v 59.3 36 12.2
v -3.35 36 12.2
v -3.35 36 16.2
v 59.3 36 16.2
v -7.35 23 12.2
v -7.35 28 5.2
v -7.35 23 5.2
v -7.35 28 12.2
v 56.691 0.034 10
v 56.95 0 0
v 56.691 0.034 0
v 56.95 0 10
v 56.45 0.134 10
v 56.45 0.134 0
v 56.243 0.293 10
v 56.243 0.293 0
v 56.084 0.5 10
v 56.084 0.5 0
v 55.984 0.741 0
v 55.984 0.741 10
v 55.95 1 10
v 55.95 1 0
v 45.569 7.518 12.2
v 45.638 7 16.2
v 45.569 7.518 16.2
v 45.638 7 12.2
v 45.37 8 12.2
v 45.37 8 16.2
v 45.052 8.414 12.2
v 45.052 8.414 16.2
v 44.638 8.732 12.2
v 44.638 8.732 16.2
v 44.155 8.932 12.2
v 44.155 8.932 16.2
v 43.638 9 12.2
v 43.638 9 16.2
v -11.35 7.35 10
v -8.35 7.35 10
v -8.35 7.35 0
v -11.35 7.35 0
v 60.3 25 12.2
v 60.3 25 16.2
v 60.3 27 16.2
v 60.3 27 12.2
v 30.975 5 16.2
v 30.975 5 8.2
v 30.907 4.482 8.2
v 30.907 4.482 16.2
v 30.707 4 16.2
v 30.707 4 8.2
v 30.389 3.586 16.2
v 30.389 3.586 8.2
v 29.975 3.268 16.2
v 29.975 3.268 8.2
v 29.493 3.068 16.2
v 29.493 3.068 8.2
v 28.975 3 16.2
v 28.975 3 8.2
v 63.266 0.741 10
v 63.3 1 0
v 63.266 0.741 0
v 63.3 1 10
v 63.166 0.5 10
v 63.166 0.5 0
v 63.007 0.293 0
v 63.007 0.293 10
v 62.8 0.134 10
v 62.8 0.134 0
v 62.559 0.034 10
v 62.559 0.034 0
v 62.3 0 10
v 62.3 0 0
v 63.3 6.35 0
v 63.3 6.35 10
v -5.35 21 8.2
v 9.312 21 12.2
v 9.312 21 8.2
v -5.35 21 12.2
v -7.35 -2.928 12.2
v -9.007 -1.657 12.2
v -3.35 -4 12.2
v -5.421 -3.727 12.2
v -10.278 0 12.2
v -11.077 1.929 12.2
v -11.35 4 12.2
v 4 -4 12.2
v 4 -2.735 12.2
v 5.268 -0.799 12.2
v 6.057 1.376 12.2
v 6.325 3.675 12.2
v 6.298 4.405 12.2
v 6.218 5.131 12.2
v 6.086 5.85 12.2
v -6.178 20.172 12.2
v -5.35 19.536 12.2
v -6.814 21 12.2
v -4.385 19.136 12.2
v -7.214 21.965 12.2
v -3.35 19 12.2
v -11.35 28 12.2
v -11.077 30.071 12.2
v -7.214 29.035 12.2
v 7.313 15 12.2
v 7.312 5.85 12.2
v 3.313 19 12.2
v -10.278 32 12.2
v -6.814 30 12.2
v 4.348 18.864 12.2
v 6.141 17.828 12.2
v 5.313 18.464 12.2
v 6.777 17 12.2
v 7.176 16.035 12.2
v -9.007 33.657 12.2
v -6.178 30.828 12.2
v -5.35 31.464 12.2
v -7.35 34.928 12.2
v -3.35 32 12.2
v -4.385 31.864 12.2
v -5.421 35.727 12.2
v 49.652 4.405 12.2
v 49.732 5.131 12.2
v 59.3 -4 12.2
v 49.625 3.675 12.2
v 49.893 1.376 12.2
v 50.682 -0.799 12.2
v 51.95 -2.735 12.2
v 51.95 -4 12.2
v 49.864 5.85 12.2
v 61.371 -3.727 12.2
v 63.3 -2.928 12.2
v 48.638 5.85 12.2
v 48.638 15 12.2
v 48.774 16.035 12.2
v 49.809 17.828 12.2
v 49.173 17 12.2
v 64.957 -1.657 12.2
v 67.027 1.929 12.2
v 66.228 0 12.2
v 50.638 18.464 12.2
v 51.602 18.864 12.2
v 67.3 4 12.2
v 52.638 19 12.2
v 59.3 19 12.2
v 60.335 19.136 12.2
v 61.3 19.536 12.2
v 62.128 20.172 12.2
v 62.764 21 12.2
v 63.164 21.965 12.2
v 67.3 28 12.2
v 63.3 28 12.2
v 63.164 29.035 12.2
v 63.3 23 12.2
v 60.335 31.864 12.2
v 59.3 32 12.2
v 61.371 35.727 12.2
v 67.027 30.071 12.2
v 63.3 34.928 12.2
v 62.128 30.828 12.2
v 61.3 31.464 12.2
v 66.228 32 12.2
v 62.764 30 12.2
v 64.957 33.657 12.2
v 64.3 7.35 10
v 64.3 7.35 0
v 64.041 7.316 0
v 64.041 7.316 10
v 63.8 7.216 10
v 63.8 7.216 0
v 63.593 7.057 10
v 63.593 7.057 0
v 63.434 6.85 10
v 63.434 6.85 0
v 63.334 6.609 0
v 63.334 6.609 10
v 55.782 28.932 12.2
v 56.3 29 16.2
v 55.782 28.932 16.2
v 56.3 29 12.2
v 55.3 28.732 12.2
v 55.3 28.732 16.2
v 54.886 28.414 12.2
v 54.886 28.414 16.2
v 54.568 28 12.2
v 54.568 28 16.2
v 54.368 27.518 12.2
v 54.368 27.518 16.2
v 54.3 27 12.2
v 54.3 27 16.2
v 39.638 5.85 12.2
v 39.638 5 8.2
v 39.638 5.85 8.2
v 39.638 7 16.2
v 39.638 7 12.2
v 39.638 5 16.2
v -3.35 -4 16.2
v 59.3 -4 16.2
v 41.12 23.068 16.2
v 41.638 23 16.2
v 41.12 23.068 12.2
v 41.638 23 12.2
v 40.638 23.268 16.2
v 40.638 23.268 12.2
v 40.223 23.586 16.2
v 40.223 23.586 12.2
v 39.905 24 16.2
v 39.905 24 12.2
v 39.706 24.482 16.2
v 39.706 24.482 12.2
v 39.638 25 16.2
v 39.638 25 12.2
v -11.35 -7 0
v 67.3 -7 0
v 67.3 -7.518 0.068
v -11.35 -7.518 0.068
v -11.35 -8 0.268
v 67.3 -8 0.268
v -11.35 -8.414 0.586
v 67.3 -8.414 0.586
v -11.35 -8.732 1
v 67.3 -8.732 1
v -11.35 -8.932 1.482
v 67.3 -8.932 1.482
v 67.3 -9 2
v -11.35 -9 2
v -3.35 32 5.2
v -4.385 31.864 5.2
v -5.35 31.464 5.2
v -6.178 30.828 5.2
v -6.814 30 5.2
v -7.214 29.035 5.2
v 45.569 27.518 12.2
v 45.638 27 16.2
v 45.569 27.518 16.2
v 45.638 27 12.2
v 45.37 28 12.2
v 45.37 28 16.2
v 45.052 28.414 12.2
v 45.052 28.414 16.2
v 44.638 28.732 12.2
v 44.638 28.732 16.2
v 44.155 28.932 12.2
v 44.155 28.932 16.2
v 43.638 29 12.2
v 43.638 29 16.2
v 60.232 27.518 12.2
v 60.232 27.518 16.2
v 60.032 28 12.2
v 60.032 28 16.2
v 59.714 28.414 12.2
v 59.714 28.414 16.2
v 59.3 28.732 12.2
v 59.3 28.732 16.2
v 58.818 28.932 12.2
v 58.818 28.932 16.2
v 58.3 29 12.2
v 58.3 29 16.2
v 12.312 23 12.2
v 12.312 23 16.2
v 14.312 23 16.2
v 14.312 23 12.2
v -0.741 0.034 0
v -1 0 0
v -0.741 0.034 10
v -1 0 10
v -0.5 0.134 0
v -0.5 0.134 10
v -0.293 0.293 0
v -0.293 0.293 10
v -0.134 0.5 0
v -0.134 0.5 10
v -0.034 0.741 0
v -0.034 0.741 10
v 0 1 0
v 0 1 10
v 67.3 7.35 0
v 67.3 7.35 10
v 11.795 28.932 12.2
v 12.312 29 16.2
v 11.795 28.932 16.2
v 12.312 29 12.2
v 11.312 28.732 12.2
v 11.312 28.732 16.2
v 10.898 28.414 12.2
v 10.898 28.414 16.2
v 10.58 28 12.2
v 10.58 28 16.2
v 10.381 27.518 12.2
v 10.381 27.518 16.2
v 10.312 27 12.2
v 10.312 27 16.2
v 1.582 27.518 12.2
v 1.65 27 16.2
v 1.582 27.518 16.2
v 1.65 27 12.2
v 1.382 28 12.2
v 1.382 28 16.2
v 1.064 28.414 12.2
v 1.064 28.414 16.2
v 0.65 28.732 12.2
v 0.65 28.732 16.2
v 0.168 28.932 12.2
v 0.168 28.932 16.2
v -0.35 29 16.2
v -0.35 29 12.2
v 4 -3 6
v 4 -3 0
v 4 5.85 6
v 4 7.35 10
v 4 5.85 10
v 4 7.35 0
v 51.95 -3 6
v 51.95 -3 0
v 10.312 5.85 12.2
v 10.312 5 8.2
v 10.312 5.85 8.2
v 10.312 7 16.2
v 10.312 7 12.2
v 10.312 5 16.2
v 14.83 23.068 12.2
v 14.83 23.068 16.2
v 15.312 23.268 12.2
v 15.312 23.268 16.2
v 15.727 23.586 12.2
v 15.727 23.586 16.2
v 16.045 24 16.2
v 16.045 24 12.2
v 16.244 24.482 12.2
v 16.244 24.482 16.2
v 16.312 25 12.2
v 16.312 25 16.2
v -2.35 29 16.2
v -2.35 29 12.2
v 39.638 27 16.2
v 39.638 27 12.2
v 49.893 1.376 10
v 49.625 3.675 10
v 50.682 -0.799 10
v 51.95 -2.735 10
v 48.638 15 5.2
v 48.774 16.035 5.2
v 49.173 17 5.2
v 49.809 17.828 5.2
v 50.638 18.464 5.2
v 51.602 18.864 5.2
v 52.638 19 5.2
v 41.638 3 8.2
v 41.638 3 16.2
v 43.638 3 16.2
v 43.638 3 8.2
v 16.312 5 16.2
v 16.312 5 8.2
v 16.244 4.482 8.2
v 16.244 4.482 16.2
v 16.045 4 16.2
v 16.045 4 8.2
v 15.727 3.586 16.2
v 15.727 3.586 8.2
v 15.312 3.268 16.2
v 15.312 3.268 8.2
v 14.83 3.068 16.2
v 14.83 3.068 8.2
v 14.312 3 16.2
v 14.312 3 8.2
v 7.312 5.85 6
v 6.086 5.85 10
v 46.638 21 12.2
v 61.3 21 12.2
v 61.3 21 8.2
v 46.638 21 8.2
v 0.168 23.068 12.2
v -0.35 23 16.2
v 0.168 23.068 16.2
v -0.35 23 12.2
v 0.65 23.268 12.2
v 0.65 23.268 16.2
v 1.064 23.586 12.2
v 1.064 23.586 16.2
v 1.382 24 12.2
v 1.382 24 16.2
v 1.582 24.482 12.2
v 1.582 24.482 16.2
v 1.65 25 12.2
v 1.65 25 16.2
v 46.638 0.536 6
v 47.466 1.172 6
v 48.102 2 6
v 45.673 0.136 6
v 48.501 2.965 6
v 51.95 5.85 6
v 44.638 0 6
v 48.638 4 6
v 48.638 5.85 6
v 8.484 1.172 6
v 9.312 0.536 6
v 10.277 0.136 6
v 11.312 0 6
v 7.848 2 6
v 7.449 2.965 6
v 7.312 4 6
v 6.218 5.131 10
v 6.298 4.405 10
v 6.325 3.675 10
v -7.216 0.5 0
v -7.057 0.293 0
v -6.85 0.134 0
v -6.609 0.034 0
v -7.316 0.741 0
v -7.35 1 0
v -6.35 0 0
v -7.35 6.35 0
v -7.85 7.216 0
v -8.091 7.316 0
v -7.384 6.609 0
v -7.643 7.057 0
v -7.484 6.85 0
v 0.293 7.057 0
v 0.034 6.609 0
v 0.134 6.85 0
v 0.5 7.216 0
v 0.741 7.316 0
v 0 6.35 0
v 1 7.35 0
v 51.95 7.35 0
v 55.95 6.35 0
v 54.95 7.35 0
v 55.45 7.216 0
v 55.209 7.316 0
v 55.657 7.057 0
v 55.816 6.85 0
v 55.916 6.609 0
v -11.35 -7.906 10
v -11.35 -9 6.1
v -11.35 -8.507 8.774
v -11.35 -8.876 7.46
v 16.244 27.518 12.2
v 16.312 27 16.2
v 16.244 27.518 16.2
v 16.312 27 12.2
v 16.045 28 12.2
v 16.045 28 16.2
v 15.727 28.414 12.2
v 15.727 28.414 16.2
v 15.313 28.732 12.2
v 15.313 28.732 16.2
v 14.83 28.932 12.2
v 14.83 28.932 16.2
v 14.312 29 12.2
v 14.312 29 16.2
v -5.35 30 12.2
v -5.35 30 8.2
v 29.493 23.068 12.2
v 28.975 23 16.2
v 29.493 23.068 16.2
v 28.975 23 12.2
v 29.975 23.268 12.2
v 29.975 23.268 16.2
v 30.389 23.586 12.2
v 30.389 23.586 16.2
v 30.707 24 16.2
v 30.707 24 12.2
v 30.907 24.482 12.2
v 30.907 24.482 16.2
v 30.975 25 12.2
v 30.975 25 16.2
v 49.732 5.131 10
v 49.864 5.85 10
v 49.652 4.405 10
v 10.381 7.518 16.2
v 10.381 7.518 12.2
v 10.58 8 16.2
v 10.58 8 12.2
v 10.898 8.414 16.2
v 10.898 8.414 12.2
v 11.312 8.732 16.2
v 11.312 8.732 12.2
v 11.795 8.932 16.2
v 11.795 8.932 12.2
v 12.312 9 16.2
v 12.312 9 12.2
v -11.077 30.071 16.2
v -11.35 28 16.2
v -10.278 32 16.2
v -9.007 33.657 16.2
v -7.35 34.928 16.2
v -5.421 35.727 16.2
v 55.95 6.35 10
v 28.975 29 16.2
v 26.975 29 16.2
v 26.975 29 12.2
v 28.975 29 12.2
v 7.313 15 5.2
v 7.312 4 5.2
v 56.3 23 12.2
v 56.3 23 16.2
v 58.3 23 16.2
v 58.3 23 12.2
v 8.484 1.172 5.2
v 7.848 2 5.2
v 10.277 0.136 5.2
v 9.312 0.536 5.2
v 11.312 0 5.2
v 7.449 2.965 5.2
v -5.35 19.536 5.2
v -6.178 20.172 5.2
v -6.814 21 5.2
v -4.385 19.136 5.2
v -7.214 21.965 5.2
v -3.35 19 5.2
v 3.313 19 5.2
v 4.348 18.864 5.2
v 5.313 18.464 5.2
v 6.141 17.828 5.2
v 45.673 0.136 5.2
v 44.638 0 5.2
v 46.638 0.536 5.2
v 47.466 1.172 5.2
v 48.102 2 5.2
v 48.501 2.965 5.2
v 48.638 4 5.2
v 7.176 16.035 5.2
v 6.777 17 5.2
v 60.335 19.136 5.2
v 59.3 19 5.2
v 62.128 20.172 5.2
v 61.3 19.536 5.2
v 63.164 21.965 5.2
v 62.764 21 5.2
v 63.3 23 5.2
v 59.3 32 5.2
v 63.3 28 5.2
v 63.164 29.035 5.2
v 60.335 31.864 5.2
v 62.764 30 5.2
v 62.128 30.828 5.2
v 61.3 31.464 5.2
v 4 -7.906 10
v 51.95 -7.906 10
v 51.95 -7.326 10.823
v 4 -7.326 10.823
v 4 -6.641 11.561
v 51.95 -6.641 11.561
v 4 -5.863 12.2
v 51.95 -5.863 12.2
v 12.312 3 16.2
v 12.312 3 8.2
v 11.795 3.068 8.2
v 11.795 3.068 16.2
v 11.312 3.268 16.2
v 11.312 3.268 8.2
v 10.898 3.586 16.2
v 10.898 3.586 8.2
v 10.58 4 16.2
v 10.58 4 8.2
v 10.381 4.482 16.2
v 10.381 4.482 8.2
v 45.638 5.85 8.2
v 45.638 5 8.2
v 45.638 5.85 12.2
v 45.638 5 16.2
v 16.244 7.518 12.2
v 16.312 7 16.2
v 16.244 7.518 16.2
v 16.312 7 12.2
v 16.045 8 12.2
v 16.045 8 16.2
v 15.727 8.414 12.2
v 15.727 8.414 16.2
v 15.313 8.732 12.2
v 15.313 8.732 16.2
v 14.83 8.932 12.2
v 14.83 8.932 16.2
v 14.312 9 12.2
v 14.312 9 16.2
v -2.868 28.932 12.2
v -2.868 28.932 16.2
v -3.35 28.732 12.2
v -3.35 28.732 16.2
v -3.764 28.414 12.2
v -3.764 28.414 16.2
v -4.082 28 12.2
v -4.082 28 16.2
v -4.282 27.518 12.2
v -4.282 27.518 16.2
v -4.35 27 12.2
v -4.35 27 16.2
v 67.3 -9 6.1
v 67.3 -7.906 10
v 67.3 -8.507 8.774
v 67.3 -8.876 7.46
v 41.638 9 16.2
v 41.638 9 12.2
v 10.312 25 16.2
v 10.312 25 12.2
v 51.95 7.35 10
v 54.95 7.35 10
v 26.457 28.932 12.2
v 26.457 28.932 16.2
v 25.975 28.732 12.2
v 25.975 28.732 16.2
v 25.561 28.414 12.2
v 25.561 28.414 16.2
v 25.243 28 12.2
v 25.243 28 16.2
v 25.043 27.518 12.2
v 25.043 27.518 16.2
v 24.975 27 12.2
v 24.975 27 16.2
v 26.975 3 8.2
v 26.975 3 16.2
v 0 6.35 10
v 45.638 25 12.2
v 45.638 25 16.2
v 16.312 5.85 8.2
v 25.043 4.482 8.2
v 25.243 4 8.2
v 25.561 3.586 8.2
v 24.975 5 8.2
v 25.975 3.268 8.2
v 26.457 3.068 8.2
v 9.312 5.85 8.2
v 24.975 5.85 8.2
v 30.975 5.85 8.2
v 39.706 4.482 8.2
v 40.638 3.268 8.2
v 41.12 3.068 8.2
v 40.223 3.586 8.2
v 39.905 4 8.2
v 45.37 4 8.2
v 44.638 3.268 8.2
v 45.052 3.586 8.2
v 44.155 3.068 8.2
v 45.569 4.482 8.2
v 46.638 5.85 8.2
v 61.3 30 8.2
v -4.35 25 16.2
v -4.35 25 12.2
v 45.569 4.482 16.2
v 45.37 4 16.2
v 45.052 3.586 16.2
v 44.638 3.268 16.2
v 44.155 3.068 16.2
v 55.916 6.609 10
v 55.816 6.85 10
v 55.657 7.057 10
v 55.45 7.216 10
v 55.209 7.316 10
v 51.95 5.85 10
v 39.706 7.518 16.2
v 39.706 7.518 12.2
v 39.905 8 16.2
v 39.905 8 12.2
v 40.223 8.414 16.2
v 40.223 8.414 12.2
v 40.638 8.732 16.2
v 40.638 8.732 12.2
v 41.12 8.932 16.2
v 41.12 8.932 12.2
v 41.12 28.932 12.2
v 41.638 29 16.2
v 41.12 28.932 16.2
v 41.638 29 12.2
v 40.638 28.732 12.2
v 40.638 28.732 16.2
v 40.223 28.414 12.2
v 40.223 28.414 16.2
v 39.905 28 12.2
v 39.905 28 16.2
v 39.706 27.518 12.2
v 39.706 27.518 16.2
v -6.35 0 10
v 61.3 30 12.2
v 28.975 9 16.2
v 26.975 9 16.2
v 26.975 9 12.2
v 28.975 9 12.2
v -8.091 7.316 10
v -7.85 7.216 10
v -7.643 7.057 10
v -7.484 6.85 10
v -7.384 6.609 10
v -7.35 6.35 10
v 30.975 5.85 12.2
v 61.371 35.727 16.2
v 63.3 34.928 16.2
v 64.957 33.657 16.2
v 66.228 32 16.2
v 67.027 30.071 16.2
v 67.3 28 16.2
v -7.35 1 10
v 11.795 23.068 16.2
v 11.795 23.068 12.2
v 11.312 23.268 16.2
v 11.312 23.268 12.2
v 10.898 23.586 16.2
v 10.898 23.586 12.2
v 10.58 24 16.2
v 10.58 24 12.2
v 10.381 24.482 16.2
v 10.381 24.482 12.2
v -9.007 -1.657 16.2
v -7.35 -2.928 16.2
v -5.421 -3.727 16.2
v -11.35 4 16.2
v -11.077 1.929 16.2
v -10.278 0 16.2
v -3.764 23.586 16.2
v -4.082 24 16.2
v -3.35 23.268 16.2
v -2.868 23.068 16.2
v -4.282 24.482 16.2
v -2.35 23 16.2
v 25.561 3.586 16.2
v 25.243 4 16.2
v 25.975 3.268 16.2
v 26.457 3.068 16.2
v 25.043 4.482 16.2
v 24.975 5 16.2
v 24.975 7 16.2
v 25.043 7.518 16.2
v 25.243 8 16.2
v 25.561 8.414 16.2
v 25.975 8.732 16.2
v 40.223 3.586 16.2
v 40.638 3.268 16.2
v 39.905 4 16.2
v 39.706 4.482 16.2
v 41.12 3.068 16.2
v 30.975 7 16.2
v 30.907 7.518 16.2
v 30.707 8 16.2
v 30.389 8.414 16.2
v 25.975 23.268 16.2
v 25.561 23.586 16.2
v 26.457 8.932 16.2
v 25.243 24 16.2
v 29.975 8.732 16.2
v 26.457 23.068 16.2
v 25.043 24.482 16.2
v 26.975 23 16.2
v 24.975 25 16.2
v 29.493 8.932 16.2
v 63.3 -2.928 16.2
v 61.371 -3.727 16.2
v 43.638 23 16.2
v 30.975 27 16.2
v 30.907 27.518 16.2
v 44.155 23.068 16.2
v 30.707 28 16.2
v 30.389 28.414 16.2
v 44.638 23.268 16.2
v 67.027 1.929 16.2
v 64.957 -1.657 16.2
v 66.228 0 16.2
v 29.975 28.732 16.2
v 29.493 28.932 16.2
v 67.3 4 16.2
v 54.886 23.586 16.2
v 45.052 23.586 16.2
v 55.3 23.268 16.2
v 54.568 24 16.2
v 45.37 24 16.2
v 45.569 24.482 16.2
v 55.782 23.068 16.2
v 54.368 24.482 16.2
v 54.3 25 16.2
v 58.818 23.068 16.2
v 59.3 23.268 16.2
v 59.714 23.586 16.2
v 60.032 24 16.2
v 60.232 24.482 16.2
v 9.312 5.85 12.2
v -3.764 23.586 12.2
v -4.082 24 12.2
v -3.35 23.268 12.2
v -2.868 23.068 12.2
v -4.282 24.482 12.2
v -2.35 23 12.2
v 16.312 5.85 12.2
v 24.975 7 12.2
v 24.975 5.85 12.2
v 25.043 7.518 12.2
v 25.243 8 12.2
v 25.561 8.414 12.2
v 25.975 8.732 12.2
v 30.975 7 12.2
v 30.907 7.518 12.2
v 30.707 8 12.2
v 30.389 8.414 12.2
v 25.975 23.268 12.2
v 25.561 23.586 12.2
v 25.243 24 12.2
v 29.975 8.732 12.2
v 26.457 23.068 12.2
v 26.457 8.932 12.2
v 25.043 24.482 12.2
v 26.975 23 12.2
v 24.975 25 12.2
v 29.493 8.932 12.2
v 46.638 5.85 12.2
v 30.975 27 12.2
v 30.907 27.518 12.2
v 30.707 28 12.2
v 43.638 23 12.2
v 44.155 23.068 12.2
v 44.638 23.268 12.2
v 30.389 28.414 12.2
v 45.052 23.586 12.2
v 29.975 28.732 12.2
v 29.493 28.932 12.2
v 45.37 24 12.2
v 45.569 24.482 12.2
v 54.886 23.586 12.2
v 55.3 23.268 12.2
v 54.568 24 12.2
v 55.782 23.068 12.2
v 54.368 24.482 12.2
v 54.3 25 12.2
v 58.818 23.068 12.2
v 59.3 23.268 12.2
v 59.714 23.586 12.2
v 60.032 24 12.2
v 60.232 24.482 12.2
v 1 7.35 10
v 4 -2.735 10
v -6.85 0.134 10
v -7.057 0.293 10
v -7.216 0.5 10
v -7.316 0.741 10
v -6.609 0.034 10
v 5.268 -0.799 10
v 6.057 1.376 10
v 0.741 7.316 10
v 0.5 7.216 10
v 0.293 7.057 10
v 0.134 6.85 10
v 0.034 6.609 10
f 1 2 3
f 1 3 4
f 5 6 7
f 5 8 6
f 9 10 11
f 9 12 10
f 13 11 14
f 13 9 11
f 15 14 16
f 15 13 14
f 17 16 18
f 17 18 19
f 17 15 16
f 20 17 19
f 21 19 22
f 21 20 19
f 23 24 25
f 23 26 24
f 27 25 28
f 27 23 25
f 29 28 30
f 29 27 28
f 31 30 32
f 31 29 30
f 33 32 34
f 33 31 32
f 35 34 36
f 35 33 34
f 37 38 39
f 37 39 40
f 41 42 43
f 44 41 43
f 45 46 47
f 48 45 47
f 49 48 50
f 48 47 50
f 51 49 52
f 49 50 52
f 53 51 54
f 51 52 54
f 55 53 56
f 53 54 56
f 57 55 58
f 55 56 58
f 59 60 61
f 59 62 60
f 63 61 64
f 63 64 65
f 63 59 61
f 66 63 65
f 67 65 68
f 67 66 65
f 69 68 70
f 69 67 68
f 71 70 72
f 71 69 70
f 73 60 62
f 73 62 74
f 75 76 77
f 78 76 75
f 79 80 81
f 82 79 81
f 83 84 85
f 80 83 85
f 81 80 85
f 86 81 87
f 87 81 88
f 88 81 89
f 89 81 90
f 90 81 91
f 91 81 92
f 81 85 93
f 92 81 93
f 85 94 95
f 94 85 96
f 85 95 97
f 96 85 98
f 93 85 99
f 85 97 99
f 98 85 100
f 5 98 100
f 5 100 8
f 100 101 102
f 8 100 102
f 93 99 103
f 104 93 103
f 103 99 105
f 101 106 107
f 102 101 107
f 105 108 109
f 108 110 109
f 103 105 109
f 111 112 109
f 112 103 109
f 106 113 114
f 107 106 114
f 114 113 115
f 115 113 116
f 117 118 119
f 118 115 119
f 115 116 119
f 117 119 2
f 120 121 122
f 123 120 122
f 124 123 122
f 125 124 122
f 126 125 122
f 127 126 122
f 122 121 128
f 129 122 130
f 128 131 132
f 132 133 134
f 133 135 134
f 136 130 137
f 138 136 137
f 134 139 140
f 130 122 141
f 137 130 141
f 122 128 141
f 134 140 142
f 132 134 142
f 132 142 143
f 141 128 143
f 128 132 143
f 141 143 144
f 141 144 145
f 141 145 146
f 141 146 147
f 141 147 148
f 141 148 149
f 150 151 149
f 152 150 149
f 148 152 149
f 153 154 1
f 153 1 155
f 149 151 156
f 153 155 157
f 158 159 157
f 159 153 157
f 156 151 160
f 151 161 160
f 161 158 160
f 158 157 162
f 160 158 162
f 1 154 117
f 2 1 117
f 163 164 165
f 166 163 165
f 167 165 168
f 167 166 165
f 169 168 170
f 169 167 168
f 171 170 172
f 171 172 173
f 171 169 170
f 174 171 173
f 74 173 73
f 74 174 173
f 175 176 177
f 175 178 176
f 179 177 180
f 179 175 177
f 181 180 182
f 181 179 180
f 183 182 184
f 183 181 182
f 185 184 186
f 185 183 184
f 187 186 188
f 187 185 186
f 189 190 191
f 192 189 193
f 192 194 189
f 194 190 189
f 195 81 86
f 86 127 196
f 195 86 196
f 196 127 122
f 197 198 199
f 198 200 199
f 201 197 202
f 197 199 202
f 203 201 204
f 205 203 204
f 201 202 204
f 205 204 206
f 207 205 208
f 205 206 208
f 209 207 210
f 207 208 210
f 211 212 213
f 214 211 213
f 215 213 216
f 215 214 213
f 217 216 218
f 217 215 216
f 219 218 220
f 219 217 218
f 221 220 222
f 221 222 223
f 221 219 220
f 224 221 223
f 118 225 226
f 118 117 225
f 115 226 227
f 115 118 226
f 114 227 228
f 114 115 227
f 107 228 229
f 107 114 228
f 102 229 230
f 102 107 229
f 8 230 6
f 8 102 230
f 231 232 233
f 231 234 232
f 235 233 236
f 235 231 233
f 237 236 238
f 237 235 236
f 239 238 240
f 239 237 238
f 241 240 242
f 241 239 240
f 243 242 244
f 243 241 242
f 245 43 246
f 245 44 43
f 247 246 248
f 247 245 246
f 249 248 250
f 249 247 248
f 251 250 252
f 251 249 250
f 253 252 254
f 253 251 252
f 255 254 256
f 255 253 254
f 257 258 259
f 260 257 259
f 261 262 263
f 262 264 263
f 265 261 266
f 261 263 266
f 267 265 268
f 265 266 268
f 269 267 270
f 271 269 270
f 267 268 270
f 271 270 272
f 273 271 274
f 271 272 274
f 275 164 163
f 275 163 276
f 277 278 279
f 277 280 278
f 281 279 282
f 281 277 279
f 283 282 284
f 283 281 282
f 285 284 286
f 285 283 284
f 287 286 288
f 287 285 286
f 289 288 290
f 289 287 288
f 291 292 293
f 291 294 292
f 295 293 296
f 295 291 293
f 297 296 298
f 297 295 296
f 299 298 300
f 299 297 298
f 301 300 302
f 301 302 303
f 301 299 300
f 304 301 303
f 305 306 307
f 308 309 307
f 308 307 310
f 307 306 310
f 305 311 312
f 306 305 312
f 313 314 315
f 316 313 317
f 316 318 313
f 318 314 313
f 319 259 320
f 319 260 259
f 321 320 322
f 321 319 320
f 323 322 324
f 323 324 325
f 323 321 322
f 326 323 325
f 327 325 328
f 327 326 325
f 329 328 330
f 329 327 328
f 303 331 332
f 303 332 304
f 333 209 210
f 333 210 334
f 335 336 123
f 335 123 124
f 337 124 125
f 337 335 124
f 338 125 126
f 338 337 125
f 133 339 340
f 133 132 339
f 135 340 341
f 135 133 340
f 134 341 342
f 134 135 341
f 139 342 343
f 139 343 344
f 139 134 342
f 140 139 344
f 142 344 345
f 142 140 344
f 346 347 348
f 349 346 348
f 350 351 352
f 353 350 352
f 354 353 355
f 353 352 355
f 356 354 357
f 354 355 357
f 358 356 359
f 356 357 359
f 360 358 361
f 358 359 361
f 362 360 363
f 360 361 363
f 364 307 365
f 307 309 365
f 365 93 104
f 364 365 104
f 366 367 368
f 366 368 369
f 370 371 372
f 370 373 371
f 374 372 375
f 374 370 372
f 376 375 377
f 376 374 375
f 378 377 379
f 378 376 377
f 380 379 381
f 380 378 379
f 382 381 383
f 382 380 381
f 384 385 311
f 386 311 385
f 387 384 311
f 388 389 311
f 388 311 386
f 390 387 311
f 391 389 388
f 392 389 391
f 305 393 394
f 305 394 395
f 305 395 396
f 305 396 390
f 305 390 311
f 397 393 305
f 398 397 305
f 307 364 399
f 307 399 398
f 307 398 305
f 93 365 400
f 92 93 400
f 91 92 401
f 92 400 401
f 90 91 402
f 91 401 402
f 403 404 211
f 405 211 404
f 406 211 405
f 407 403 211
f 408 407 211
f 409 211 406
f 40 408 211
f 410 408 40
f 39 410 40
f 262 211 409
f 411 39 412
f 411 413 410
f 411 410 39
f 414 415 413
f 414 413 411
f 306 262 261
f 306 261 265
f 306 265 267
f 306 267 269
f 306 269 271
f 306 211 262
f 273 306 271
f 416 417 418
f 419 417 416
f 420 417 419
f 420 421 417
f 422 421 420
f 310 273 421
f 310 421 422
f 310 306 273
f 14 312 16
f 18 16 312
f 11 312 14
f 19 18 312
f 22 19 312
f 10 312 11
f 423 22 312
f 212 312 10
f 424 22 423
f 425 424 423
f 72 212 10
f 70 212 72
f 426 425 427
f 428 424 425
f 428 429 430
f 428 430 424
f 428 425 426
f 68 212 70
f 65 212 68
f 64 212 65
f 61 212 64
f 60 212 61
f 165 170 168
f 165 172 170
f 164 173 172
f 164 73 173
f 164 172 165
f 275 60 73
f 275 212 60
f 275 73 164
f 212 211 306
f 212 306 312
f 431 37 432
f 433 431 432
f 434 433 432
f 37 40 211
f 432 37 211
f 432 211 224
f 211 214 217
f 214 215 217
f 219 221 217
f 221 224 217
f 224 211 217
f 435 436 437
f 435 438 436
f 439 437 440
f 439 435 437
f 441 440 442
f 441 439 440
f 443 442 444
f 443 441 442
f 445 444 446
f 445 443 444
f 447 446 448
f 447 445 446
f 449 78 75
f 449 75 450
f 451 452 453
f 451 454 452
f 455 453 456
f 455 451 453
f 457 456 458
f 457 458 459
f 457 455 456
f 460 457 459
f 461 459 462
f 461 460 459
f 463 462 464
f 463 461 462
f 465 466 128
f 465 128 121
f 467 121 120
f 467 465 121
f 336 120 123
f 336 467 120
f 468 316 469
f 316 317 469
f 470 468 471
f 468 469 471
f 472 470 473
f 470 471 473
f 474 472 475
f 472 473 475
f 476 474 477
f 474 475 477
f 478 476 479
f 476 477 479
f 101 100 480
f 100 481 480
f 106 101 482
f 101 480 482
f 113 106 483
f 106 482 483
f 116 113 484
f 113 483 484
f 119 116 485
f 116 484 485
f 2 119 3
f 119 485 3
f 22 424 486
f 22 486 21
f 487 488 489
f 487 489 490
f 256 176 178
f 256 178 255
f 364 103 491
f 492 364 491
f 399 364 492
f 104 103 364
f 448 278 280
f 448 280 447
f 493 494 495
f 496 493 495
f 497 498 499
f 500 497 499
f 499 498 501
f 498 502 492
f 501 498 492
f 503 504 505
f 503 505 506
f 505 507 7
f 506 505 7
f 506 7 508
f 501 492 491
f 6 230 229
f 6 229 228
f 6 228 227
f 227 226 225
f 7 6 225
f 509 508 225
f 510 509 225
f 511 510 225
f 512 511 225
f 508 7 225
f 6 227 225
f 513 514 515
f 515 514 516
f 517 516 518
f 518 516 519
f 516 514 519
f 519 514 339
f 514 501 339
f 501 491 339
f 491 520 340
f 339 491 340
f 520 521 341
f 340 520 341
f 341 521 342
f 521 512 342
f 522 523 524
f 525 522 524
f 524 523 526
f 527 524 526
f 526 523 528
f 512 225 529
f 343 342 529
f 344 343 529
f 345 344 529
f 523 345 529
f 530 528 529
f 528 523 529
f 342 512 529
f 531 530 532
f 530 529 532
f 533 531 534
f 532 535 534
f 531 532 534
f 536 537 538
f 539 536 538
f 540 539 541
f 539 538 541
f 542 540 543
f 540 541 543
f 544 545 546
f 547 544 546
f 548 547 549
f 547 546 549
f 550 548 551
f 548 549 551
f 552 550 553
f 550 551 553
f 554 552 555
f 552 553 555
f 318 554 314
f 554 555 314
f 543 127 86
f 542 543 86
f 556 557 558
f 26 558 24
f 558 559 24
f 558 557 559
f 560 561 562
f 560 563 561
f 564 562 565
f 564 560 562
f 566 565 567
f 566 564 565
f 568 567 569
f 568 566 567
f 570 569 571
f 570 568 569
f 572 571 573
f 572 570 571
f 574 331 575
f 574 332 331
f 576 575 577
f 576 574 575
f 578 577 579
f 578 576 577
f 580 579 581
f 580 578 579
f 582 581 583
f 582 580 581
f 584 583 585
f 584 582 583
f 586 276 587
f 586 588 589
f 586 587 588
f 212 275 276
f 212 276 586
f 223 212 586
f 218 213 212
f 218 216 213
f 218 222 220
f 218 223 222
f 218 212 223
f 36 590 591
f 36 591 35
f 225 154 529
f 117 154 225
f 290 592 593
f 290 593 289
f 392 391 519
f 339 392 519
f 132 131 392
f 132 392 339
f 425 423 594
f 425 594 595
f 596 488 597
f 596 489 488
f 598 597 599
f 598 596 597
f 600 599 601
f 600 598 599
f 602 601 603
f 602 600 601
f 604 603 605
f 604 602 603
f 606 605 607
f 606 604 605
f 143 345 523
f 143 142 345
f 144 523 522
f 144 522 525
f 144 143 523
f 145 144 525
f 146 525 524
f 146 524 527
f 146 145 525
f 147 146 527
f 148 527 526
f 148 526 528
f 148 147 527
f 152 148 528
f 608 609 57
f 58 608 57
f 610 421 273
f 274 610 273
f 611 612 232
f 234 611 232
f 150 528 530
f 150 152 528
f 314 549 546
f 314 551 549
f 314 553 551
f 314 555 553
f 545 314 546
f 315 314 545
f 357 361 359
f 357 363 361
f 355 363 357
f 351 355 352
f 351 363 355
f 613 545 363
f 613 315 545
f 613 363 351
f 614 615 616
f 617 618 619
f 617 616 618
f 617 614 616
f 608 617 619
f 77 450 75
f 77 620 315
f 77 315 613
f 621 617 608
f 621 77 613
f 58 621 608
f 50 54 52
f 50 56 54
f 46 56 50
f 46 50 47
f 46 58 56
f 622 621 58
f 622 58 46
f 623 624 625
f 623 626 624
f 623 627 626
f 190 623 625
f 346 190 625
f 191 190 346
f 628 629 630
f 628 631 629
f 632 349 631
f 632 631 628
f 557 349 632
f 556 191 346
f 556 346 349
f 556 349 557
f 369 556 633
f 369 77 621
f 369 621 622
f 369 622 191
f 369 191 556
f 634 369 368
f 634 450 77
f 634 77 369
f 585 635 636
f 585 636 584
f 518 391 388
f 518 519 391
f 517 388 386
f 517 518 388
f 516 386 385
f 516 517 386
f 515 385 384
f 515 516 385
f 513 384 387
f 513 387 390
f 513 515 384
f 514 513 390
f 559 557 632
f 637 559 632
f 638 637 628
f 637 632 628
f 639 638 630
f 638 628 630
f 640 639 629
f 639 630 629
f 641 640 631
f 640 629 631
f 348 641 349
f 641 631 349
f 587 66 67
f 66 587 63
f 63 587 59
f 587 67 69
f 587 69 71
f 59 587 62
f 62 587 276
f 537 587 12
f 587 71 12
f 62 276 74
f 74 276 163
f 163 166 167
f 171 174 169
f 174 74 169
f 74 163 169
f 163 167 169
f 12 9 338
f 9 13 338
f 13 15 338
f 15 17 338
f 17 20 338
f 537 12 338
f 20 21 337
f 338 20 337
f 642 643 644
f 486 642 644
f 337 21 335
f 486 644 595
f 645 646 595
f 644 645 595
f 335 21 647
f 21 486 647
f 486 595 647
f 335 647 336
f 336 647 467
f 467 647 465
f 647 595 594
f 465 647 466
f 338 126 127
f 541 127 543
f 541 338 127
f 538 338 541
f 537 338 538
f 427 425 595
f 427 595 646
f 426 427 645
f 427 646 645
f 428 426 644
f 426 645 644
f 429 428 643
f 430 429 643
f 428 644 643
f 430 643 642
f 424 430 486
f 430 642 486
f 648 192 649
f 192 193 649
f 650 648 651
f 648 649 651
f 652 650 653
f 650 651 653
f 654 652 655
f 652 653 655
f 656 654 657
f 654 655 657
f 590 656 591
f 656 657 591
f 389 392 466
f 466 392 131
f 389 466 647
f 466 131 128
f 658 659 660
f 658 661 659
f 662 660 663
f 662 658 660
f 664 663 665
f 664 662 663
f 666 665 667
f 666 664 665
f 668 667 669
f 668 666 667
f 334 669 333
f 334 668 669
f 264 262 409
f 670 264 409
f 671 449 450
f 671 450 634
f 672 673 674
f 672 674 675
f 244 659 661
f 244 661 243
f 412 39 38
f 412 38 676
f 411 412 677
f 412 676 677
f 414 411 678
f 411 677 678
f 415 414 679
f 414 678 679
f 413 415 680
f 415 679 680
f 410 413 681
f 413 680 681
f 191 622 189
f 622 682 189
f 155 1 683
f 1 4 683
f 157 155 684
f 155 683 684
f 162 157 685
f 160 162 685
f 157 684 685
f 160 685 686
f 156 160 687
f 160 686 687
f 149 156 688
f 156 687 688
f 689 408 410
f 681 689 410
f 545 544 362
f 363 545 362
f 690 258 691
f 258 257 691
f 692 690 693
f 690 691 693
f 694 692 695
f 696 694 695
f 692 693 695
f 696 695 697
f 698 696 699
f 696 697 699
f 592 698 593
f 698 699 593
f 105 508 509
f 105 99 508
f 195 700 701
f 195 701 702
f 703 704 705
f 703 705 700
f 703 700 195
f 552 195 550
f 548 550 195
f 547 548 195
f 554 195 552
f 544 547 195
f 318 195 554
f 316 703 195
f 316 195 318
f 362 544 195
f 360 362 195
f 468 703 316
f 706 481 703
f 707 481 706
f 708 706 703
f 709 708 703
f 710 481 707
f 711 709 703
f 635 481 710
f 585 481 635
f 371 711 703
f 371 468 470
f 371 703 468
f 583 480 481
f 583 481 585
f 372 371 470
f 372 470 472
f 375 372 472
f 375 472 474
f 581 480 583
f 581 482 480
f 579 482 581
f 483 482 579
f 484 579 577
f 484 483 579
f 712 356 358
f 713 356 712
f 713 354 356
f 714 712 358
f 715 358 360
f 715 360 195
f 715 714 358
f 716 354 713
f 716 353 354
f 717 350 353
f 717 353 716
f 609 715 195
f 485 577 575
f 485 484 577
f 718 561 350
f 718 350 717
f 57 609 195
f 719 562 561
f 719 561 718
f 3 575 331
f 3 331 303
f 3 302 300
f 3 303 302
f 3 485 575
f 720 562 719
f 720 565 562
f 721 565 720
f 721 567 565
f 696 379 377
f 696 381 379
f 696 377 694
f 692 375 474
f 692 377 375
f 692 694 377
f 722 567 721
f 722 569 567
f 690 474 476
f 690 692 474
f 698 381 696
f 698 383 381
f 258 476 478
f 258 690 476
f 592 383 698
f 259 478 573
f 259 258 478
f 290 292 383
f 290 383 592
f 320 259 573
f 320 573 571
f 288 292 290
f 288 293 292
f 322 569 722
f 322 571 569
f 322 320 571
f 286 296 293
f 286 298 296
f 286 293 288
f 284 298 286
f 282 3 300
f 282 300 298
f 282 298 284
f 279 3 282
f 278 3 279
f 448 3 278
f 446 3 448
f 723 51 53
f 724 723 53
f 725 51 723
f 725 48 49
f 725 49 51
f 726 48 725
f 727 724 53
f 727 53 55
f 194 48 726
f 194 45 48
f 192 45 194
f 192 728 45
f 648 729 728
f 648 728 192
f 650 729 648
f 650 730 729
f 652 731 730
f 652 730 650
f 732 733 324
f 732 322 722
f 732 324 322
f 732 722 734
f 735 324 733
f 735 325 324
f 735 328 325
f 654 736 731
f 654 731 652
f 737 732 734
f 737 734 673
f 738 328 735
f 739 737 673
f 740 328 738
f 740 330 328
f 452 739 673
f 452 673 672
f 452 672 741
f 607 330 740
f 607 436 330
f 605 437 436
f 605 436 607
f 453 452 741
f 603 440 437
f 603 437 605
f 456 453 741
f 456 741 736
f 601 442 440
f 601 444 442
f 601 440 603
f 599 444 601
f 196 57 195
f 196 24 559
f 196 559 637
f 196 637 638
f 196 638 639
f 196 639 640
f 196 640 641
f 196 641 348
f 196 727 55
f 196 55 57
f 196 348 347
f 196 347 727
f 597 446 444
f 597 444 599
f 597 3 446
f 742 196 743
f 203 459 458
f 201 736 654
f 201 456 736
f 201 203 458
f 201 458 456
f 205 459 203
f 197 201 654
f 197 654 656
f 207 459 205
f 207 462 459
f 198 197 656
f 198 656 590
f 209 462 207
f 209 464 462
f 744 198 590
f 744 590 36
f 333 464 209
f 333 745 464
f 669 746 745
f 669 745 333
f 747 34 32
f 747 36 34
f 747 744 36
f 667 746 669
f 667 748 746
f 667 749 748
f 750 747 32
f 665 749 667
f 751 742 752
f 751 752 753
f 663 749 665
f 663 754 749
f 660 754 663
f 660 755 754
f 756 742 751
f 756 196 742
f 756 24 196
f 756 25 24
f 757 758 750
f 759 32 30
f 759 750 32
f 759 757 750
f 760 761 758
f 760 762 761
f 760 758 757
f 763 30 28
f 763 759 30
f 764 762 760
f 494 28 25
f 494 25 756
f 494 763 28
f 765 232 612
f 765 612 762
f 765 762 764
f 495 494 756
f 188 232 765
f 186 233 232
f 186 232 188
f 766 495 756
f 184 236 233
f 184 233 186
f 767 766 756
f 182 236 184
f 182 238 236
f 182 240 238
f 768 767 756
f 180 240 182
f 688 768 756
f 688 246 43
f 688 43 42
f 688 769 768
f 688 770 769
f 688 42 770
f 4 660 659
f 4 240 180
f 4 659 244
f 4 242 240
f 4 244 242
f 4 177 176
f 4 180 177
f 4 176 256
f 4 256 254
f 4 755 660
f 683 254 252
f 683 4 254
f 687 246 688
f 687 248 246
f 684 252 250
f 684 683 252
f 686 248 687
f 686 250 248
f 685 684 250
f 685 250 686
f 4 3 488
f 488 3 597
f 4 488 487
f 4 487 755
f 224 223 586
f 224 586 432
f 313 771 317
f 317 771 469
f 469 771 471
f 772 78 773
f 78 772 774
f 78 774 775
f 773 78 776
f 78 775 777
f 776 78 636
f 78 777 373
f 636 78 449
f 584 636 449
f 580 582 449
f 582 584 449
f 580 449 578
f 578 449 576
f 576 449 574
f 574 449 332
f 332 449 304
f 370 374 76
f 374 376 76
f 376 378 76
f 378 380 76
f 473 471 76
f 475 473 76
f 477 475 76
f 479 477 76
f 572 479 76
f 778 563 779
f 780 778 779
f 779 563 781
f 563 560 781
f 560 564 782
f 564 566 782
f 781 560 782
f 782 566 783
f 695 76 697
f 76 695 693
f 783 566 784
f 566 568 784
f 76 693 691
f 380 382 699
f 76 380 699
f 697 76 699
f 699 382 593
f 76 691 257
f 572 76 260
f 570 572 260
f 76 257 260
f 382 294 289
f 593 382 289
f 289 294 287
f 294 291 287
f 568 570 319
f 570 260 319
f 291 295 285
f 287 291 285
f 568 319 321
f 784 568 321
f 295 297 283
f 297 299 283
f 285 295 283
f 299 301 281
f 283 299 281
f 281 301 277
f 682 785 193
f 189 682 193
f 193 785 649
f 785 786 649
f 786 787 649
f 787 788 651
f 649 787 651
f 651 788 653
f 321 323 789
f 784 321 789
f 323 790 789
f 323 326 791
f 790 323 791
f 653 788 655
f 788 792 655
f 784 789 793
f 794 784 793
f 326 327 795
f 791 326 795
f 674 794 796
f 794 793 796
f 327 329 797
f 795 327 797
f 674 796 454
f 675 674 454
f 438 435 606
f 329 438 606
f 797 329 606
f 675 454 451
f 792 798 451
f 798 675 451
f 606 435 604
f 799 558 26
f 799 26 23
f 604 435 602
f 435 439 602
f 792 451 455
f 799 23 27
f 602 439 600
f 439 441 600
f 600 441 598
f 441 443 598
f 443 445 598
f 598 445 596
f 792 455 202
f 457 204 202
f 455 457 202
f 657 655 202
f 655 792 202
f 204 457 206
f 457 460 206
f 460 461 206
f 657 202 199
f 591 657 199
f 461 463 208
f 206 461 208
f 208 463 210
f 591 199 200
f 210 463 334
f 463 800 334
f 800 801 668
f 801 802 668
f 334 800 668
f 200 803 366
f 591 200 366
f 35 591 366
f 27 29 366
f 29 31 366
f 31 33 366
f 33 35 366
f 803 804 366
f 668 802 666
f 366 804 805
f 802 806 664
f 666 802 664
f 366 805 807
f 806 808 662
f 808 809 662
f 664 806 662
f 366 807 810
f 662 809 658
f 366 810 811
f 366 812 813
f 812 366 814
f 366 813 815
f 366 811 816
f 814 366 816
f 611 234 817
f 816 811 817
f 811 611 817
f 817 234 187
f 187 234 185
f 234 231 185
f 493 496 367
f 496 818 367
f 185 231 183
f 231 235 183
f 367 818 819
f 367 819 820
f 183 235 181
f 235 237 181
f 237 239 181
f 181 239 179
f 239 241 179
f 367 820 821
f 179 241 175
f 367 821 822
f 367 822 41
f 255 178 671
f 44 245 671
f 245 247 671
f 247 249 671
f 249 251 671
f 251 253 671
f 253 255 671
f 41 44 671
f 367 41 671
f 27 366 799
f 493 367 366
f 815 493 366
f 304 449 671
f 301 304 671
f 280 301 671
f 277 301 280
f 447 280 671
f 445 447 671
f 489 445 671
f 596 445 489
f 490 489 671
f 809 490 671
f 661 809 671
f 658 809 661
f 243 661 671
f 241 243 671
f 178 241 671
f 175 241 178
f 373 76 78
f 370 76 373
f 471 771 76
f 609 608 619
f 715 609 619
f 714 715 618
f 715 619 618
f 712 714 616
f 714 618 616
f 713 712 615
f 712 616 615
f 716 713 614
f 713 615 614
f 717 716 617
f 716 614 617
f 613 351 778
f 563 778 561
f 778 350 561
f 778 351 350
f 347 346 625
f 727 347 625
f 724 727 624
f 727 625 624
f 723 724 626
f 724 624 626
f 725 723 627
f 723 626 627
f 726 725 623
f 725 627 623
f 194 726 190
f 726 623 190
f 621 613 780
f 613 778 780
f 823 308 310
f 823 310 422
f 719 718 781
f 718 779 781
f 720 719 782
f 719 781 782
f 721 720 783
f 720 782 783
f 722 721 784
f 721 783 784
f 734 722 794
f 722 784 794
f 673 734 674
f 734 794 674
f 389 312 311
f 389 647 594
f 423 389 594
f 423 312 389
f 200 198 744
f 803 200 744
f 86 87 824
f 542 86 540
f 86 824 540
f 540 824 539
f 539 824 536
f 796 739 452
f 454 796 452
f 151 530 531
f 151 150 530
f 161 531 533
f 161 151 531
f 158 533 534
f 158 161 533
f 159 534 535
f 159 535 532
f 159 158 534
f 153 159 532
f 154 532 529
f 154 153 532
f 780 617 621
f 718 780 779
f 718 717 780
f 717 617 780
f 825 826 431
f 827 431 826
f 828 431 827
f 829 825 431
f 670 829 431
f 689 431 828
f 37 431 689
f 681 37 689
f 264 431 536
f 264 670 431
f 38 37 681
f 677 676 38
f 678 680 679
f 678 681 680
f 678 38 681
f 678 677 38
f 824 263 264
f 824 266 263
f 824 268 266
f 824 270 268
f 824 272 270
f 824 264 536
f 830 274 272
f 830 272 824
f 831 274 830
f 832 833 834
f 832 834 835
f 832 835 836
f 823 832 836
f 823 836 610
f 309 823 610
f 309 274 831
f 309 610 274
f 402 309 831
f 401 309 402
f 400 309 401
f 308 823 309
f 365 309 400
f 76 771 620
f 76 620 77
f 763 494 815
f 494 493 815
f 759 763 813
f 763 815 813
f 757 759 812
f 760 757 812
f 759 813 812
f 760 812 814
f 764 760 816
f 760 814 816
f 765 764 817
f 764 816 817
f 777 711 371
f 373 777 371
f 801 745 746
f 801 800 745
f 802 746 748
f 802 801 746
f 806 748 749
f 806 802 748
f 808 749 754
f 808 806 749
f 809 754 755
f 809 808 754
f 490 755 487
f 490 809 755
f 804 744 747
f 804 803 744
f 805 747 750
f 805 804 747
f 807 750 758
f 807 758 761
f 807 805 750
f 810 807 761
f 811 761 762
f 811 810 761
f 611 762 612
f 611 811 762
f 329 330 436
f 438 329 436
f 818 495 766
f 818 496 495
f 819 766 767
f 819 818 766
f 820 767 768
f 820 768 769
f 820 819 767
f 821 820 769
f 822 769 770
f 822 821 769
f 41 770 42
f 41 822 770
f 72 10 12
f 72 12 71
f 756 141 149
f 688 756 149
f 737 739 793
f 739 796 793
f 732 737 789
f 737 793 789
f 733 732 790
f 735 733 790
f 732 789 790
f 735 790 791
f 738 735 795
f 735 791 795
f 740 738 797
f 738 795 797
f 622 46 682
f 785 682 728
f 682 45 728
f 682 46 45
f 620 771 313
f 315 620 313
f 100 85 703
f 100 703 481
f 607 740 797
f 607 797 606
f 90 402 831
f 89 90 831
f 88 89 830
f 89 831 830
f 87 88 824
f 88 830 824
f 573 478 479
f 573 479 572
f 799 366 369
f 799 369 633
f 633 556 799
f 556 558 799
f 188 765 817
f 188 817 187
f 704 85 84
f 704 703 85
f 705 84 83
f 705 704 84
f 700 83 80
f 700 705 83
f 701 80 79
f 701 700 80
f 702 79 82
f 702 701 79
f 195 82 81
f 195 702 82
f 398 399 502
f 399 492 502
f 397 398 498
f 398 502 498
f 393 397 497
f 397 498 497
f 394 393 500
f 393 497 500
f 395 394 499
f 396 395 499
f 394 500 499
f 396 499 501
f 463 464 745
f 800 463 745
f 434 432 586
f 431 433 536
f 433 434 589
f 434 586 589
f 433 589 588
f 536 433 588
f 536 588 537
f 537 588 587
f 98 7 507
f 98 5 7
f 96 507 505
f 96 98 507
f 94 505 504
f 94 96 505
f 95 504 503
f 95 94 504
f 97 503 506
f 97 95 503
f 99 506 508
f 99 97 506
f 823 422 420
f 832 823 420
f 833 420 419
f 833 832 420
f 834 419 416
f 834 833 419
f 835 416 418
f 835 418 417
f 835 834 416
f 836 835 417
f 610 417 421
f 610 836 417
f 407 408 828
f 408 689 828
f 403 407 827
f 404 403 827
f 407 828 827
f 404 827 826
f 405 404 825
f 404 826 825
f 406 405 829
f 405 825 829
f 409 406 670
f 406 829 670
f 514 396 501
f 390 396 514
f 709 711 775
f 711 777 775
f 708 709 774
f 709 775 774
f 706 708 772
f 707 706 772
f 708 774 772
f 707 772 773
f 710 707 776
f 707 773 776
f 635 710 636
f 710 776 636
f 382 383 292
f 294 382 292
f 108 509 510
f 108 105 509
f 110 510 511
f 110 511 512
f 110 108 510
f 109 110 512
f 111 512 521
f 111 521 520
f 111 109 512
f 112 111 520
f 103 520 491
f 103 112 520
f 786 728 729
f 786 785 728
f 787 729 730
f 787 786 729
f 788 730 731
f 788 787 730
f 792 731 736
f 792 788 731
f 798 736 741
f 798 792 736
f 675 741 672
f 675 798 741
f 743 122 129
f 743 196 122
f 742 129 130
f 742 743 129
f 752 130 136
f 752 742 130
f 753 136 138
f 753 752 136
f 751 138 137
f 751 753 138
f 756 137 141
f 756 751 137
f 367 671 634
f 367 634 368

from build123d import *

# Parameters (mm, degrees)
BOSS_EXTRUDE1_DEPTH      = 10
SKETCH2_W                = 10
SKETCH2_H                = 6
BOSS_EXTRUDE2_DEPTH      = 23.975
SKETCH3_W                = 23.975
SKETCH3_H                = 6
BOSS_EXTRUDE4_DEPTH      = 2.2
BOSS_EXTRUDE4_DEPTH_BACK = 4
BOSS_EXTRUDE5_DEPTH      = 4
SKETCH5_W                = 78.65
SKETCH5_H                = 40
BOSS_EXTRUDE6_DEPTH      = 4
CUT_EXTRUDE1_DEPTH       = 79.65
FILLET1_R                = 2
SKETCH7_W                = 6
SKETCH7_H                = 6
CUT_EXTRUDE2_DEPTH       = 45
FILLET2_R                = 2
FILLET3_R                = 8
BOSS_EXTRUDE7_START      = 4
BOSS_EXTRUDE7_DEPTH      = 3
EXTRUDE_THIN1_DEPTH      = 4
FILLET4_R                = 4
FILLET5_R                = 1


with BuildPart() as part:
    # Sketch1 → Boss-Extrude1 (new body)
    with BuildSketch(Plane.XY):
        Polygon((0, 0), (-7.35, 0), (-7.35, 7.35), (-11.35, 7.35), (-11.35, -9), (4, -9), (4, 7.35), (0, 7.35), align=None)
    extrude(amount=BOSS_EXTRUDE1_DEPTH)

    # Sketch2 → Boss-Extrude2 (add)
    with BuildSketch(Plane(origin=(4, 0, 0), x_dir=(0, 0, -1), z_dir=(1, 0, 0))):
        with Locations((-5, -6)):
            Rectangle(SKETCH2_W, SKETCH2_H)
    extrude(amount=BOSS_EXTRUDE2_DEPTH)

    # Sketch3 → Boss-Extrude4 (add, two sides)
    with BuildSketch(Plane.XY.offset(10)) as boss_extrude4_sk:
        with BuildLine():
            Line((4, -2.735489451), (4, -3))
            Line((4, -3), (27.975, -3))
            Line((27.975, -3), (27.975, 5.85))
            Line((27.975, 5.85), (6.085603209, 5.85))
            ThreePointArc((6.085603209, 5.85), (6.264970626, 4.769067619), (6.325, 3.675))
            ThreePointArc((6.325, 3.675), (5.725797838, 0.265454576), (4, -2.735489451))
        make_face()
        with Locations((15.9875, -6)):
            Rectangle(SKETCH3_W, SKETCH3_H)
    extrude(amount=BOSS_EXTRUDE4_DEPTH)
    extrude(boss_extrude4_sk.sketch, amount=-BOSS_EXTRUDE4_DEPTH_BACK)

    # Sketch3<3> → Boss-Extrude5 (add)
    with BuildSketch(Plane.XY.offset(10)):
        with BuildLine():
            Line((4, 5.85), (4, -2.735489451))
            ThreePointArc((4, -2.735489451), (5.725797838, 0.265454576), (6.325, 3.675))
            ThreePointArc((6.325, 3.675), (6.264970626, 4.769067619), (6.085603209, 5.85))
            Line((6.085603209, 5.85), (4, 5.85))
        make_face()
    extrude(amount=-BOSS_EXTRUDE5_DEPTH)

    # Mirror1: part across plane


with BuildPart() as part_1:
    add(part.part)
    add(part.part.mirror(Plane.ZY.offset(-27.975)))

    # Sketch5 → Boss-Extrude6 (add)
    with BuildSketch(Plane.XY.offset(12.2)):
        with Locations((27.975, 16)):
            Rectangle(SKETCH5_W, SKETCH5_H)
    extrude(amount=BOSS_EXTRUDE6_DEPTH)

    # Sketch6 → Cut-Extrude1 (cut, through all)
    with BuildSketch(Plane(origin=(67.3, 0, 0), x_dir=(0, 0, -1), z_dir=(1, 0, 0))):
        with BuildLine():
            Line((-12.2, -9), (-10, -9))
            Line((-10, -9), (-10, -7.906246951))
            ThreePointArc((-10, -7.906246951), (-11.20325575, -6.996069572), (-12.2, -5.863484846))
            Line((-12.2, -5.863484846), (-12.2, -9))
        make_face()
        with BuildLine():
            Line((-10, -9), (-6.1, -9))
            ThreePointArc((-6.1, -9), (-8.125234291, -8.721386714), (-10, -7.906246951))
            Line((-10, -7.906246951), (-10, -9))
        make_face()
    extrude(amount=-CUT_EXTRUDE1_DEPTH, mode=Mode.SUBTRACT)

    # Fillet1
    fillet1_edges = [part_1.edges().sort_by_distance(p)[0] for p in [
        (27.975, -9, 0),
    ]]
    fillet(fillet1_edges, radius=FILLET1_R)

    # Sketch7 → Cut-Extrude2 (cut)
    with BuildSketch(Plane.XY.offset(16.2)):
        with Locations((-1.35, 26)):
            Rectangle(SKETCH7_W, SKETCH7_H)
        with Locations((13.3125, 26)):
            Rectangle(SKETCH7_W, SKETCH7_H)
        with Locations((27.975, 26)):
            Rectangle(SKETCH7_W, SKETCH7_H)
        with Locations((42.6375, 26)):
            Rectangle(SKETCH7_W, SKETCH7_H)
        with Locations((13.3125, 6)):
            Rectangle(SKETCH7_W, SKETCH7_H)
        with Locations((27.975, 6)):
            Rectangle(SKETCH7_W, SKETCH7_H)
        with Locations((42.6375, 6)):
            Rectangle(SKETCH7_W, SKETCH7_H)
        with Locations((57.3, 26)):
            Rectangle(SKETCH7_W, SKETCH7_H)
    extrude(amount=-CUT_EXTRUDE2_DEPTH, mode=Mode.SUBTRACT)

    # Fillet2
    fillet2_edges = [part_1.edges().sort_by_distance(p)[0] for p in [
        (-4.35, 23, 14.2),
        (-4.35, 29, 14.2),
        (1.65, 29, 14.2),
        (1.65, 23, 14.2),
        (54.3, 29, 14.2),
        (60.3, 29, 14.2),
        (60.3, 23, 14.2),
        (54.3, 23, 14.2),
        (45.6375, 9, 14.2),
        (45.6375, 3, 11.1),
        (39.6375, 3, 11.1),
        (39.6375, 9, 14.2),
        (30.975, 9, 14.2),
        (30.975, 3, 11.1),
        (24.975, 3, 11.1),
        (24.975, 9, 14.2),
        (10.3125, 29, 14.2),
        (16.3125, 29, 14.2),
        (16.3125, 23, 14.2),
        (10.3125, 23, 14.2),
        (24.975, 29, 14.2),
        (30.975, 29, 14.2),
        (30.975, 23, 14.2),
        (24.975, 23, 14.2),
        (39.6375, 29, 14.2),
        (45.6375, 29, 14.2),
        (45.6375, 23, 14.2),
        (39.6375, 23, 14.2),
        (16.3125, 9, 14.2),
        (16.3125, 3, 11.1),
        (10.3125, 3, 11.1),
        (10.3125, 9, 14.2),
    ]]
    fillet(fillet2_edges, radius=FILLET2_R)

    # Fillet3
    fillet3_edges = [part_1.edges().sort_by_distance(p)[0] for p in [
        (-11.35, 36, 14.2),
        (-11.35, -4, 14.2),
        (67.3, -4, 14.2),
        (67.3, 36, 14.2),
    ]]
    fillet(fillet3_edges, radius=FILLET3_R)

    # Sketch8 → Boss-Extrude7 (add)
    with BuildSketch(Plane(origin=(0, 0, 12.2), x_dir=(-1, 0, 0), z_dir=(0, 0, -1)).offset(BOSS_EXTRUDE7_START)):
        Polygon((-63.3, 32), (7.35, 32), (7.35, 19), (-7.3125, 19), (-7.3125, 0), (-48.6375, 0), (-48.6375, 19), (-63.3, 19), align=None)
    extrude(amount=BOSS_EXTRUDE7_DEPTH)

    # Sketch8<2> → Extrude-Thin1 (add)
    with BuildSketch(Plane(origin=(0, 0, 12.2), x_dir=(-1, 0, 0), z_dir=(0, 0, -1))):
        Polygon((-48.6375, 0), (-48.6375, 19), (-63.3, 19), (-63.3, 32), (7.35, 32), (7.35, 19), (-7.3125, 19), (-7.3125, 0), (-9.3125, 0), (-9.3125, 21), (5.35, 21), (5.35, 30), (-61.3, 30), (-61.3, 21), (-46.6375, 21), (-46.6375, 0), align=None)
    extrude(amount=EXTRUDE_THIN1_DEPTH)

    # Fillet4
    fillet4_edges = [part_1.edges().sort_by_distance(p)[0] for p in [
        (48.6375, 19, 8.7),
        (48.6375, 0, 5.6),
        (7.3125, 0, 5.6),
        (63.3, 32, 8.7),
        (63.3, 19, 8.7),
        (7.3125, 19, 8.7),
        (-7.35, 19, 8.7),
        (-7.35, 32, 8.7),
    ]]
    fillet(fillet4_edges, radius=FILLET4_R)

    # Fillet5
    fillet5_edges = [part_1.edges().sort_by_distance(p)[0] for p in [
        (0, 7.35, 5),
        (0, 0, 5),
        (-7.35, 0, 5),
        (-7.35, 7.35, 5),
        (55.95, 7.35, 5),
        (55.95, 0, 5),
        (63.3, 0, 5),
        (63.3, 7.35, 5),
    ]]
    fillet(fillet5_edges, radius=FILLET5_R)


solid = part_1.part
